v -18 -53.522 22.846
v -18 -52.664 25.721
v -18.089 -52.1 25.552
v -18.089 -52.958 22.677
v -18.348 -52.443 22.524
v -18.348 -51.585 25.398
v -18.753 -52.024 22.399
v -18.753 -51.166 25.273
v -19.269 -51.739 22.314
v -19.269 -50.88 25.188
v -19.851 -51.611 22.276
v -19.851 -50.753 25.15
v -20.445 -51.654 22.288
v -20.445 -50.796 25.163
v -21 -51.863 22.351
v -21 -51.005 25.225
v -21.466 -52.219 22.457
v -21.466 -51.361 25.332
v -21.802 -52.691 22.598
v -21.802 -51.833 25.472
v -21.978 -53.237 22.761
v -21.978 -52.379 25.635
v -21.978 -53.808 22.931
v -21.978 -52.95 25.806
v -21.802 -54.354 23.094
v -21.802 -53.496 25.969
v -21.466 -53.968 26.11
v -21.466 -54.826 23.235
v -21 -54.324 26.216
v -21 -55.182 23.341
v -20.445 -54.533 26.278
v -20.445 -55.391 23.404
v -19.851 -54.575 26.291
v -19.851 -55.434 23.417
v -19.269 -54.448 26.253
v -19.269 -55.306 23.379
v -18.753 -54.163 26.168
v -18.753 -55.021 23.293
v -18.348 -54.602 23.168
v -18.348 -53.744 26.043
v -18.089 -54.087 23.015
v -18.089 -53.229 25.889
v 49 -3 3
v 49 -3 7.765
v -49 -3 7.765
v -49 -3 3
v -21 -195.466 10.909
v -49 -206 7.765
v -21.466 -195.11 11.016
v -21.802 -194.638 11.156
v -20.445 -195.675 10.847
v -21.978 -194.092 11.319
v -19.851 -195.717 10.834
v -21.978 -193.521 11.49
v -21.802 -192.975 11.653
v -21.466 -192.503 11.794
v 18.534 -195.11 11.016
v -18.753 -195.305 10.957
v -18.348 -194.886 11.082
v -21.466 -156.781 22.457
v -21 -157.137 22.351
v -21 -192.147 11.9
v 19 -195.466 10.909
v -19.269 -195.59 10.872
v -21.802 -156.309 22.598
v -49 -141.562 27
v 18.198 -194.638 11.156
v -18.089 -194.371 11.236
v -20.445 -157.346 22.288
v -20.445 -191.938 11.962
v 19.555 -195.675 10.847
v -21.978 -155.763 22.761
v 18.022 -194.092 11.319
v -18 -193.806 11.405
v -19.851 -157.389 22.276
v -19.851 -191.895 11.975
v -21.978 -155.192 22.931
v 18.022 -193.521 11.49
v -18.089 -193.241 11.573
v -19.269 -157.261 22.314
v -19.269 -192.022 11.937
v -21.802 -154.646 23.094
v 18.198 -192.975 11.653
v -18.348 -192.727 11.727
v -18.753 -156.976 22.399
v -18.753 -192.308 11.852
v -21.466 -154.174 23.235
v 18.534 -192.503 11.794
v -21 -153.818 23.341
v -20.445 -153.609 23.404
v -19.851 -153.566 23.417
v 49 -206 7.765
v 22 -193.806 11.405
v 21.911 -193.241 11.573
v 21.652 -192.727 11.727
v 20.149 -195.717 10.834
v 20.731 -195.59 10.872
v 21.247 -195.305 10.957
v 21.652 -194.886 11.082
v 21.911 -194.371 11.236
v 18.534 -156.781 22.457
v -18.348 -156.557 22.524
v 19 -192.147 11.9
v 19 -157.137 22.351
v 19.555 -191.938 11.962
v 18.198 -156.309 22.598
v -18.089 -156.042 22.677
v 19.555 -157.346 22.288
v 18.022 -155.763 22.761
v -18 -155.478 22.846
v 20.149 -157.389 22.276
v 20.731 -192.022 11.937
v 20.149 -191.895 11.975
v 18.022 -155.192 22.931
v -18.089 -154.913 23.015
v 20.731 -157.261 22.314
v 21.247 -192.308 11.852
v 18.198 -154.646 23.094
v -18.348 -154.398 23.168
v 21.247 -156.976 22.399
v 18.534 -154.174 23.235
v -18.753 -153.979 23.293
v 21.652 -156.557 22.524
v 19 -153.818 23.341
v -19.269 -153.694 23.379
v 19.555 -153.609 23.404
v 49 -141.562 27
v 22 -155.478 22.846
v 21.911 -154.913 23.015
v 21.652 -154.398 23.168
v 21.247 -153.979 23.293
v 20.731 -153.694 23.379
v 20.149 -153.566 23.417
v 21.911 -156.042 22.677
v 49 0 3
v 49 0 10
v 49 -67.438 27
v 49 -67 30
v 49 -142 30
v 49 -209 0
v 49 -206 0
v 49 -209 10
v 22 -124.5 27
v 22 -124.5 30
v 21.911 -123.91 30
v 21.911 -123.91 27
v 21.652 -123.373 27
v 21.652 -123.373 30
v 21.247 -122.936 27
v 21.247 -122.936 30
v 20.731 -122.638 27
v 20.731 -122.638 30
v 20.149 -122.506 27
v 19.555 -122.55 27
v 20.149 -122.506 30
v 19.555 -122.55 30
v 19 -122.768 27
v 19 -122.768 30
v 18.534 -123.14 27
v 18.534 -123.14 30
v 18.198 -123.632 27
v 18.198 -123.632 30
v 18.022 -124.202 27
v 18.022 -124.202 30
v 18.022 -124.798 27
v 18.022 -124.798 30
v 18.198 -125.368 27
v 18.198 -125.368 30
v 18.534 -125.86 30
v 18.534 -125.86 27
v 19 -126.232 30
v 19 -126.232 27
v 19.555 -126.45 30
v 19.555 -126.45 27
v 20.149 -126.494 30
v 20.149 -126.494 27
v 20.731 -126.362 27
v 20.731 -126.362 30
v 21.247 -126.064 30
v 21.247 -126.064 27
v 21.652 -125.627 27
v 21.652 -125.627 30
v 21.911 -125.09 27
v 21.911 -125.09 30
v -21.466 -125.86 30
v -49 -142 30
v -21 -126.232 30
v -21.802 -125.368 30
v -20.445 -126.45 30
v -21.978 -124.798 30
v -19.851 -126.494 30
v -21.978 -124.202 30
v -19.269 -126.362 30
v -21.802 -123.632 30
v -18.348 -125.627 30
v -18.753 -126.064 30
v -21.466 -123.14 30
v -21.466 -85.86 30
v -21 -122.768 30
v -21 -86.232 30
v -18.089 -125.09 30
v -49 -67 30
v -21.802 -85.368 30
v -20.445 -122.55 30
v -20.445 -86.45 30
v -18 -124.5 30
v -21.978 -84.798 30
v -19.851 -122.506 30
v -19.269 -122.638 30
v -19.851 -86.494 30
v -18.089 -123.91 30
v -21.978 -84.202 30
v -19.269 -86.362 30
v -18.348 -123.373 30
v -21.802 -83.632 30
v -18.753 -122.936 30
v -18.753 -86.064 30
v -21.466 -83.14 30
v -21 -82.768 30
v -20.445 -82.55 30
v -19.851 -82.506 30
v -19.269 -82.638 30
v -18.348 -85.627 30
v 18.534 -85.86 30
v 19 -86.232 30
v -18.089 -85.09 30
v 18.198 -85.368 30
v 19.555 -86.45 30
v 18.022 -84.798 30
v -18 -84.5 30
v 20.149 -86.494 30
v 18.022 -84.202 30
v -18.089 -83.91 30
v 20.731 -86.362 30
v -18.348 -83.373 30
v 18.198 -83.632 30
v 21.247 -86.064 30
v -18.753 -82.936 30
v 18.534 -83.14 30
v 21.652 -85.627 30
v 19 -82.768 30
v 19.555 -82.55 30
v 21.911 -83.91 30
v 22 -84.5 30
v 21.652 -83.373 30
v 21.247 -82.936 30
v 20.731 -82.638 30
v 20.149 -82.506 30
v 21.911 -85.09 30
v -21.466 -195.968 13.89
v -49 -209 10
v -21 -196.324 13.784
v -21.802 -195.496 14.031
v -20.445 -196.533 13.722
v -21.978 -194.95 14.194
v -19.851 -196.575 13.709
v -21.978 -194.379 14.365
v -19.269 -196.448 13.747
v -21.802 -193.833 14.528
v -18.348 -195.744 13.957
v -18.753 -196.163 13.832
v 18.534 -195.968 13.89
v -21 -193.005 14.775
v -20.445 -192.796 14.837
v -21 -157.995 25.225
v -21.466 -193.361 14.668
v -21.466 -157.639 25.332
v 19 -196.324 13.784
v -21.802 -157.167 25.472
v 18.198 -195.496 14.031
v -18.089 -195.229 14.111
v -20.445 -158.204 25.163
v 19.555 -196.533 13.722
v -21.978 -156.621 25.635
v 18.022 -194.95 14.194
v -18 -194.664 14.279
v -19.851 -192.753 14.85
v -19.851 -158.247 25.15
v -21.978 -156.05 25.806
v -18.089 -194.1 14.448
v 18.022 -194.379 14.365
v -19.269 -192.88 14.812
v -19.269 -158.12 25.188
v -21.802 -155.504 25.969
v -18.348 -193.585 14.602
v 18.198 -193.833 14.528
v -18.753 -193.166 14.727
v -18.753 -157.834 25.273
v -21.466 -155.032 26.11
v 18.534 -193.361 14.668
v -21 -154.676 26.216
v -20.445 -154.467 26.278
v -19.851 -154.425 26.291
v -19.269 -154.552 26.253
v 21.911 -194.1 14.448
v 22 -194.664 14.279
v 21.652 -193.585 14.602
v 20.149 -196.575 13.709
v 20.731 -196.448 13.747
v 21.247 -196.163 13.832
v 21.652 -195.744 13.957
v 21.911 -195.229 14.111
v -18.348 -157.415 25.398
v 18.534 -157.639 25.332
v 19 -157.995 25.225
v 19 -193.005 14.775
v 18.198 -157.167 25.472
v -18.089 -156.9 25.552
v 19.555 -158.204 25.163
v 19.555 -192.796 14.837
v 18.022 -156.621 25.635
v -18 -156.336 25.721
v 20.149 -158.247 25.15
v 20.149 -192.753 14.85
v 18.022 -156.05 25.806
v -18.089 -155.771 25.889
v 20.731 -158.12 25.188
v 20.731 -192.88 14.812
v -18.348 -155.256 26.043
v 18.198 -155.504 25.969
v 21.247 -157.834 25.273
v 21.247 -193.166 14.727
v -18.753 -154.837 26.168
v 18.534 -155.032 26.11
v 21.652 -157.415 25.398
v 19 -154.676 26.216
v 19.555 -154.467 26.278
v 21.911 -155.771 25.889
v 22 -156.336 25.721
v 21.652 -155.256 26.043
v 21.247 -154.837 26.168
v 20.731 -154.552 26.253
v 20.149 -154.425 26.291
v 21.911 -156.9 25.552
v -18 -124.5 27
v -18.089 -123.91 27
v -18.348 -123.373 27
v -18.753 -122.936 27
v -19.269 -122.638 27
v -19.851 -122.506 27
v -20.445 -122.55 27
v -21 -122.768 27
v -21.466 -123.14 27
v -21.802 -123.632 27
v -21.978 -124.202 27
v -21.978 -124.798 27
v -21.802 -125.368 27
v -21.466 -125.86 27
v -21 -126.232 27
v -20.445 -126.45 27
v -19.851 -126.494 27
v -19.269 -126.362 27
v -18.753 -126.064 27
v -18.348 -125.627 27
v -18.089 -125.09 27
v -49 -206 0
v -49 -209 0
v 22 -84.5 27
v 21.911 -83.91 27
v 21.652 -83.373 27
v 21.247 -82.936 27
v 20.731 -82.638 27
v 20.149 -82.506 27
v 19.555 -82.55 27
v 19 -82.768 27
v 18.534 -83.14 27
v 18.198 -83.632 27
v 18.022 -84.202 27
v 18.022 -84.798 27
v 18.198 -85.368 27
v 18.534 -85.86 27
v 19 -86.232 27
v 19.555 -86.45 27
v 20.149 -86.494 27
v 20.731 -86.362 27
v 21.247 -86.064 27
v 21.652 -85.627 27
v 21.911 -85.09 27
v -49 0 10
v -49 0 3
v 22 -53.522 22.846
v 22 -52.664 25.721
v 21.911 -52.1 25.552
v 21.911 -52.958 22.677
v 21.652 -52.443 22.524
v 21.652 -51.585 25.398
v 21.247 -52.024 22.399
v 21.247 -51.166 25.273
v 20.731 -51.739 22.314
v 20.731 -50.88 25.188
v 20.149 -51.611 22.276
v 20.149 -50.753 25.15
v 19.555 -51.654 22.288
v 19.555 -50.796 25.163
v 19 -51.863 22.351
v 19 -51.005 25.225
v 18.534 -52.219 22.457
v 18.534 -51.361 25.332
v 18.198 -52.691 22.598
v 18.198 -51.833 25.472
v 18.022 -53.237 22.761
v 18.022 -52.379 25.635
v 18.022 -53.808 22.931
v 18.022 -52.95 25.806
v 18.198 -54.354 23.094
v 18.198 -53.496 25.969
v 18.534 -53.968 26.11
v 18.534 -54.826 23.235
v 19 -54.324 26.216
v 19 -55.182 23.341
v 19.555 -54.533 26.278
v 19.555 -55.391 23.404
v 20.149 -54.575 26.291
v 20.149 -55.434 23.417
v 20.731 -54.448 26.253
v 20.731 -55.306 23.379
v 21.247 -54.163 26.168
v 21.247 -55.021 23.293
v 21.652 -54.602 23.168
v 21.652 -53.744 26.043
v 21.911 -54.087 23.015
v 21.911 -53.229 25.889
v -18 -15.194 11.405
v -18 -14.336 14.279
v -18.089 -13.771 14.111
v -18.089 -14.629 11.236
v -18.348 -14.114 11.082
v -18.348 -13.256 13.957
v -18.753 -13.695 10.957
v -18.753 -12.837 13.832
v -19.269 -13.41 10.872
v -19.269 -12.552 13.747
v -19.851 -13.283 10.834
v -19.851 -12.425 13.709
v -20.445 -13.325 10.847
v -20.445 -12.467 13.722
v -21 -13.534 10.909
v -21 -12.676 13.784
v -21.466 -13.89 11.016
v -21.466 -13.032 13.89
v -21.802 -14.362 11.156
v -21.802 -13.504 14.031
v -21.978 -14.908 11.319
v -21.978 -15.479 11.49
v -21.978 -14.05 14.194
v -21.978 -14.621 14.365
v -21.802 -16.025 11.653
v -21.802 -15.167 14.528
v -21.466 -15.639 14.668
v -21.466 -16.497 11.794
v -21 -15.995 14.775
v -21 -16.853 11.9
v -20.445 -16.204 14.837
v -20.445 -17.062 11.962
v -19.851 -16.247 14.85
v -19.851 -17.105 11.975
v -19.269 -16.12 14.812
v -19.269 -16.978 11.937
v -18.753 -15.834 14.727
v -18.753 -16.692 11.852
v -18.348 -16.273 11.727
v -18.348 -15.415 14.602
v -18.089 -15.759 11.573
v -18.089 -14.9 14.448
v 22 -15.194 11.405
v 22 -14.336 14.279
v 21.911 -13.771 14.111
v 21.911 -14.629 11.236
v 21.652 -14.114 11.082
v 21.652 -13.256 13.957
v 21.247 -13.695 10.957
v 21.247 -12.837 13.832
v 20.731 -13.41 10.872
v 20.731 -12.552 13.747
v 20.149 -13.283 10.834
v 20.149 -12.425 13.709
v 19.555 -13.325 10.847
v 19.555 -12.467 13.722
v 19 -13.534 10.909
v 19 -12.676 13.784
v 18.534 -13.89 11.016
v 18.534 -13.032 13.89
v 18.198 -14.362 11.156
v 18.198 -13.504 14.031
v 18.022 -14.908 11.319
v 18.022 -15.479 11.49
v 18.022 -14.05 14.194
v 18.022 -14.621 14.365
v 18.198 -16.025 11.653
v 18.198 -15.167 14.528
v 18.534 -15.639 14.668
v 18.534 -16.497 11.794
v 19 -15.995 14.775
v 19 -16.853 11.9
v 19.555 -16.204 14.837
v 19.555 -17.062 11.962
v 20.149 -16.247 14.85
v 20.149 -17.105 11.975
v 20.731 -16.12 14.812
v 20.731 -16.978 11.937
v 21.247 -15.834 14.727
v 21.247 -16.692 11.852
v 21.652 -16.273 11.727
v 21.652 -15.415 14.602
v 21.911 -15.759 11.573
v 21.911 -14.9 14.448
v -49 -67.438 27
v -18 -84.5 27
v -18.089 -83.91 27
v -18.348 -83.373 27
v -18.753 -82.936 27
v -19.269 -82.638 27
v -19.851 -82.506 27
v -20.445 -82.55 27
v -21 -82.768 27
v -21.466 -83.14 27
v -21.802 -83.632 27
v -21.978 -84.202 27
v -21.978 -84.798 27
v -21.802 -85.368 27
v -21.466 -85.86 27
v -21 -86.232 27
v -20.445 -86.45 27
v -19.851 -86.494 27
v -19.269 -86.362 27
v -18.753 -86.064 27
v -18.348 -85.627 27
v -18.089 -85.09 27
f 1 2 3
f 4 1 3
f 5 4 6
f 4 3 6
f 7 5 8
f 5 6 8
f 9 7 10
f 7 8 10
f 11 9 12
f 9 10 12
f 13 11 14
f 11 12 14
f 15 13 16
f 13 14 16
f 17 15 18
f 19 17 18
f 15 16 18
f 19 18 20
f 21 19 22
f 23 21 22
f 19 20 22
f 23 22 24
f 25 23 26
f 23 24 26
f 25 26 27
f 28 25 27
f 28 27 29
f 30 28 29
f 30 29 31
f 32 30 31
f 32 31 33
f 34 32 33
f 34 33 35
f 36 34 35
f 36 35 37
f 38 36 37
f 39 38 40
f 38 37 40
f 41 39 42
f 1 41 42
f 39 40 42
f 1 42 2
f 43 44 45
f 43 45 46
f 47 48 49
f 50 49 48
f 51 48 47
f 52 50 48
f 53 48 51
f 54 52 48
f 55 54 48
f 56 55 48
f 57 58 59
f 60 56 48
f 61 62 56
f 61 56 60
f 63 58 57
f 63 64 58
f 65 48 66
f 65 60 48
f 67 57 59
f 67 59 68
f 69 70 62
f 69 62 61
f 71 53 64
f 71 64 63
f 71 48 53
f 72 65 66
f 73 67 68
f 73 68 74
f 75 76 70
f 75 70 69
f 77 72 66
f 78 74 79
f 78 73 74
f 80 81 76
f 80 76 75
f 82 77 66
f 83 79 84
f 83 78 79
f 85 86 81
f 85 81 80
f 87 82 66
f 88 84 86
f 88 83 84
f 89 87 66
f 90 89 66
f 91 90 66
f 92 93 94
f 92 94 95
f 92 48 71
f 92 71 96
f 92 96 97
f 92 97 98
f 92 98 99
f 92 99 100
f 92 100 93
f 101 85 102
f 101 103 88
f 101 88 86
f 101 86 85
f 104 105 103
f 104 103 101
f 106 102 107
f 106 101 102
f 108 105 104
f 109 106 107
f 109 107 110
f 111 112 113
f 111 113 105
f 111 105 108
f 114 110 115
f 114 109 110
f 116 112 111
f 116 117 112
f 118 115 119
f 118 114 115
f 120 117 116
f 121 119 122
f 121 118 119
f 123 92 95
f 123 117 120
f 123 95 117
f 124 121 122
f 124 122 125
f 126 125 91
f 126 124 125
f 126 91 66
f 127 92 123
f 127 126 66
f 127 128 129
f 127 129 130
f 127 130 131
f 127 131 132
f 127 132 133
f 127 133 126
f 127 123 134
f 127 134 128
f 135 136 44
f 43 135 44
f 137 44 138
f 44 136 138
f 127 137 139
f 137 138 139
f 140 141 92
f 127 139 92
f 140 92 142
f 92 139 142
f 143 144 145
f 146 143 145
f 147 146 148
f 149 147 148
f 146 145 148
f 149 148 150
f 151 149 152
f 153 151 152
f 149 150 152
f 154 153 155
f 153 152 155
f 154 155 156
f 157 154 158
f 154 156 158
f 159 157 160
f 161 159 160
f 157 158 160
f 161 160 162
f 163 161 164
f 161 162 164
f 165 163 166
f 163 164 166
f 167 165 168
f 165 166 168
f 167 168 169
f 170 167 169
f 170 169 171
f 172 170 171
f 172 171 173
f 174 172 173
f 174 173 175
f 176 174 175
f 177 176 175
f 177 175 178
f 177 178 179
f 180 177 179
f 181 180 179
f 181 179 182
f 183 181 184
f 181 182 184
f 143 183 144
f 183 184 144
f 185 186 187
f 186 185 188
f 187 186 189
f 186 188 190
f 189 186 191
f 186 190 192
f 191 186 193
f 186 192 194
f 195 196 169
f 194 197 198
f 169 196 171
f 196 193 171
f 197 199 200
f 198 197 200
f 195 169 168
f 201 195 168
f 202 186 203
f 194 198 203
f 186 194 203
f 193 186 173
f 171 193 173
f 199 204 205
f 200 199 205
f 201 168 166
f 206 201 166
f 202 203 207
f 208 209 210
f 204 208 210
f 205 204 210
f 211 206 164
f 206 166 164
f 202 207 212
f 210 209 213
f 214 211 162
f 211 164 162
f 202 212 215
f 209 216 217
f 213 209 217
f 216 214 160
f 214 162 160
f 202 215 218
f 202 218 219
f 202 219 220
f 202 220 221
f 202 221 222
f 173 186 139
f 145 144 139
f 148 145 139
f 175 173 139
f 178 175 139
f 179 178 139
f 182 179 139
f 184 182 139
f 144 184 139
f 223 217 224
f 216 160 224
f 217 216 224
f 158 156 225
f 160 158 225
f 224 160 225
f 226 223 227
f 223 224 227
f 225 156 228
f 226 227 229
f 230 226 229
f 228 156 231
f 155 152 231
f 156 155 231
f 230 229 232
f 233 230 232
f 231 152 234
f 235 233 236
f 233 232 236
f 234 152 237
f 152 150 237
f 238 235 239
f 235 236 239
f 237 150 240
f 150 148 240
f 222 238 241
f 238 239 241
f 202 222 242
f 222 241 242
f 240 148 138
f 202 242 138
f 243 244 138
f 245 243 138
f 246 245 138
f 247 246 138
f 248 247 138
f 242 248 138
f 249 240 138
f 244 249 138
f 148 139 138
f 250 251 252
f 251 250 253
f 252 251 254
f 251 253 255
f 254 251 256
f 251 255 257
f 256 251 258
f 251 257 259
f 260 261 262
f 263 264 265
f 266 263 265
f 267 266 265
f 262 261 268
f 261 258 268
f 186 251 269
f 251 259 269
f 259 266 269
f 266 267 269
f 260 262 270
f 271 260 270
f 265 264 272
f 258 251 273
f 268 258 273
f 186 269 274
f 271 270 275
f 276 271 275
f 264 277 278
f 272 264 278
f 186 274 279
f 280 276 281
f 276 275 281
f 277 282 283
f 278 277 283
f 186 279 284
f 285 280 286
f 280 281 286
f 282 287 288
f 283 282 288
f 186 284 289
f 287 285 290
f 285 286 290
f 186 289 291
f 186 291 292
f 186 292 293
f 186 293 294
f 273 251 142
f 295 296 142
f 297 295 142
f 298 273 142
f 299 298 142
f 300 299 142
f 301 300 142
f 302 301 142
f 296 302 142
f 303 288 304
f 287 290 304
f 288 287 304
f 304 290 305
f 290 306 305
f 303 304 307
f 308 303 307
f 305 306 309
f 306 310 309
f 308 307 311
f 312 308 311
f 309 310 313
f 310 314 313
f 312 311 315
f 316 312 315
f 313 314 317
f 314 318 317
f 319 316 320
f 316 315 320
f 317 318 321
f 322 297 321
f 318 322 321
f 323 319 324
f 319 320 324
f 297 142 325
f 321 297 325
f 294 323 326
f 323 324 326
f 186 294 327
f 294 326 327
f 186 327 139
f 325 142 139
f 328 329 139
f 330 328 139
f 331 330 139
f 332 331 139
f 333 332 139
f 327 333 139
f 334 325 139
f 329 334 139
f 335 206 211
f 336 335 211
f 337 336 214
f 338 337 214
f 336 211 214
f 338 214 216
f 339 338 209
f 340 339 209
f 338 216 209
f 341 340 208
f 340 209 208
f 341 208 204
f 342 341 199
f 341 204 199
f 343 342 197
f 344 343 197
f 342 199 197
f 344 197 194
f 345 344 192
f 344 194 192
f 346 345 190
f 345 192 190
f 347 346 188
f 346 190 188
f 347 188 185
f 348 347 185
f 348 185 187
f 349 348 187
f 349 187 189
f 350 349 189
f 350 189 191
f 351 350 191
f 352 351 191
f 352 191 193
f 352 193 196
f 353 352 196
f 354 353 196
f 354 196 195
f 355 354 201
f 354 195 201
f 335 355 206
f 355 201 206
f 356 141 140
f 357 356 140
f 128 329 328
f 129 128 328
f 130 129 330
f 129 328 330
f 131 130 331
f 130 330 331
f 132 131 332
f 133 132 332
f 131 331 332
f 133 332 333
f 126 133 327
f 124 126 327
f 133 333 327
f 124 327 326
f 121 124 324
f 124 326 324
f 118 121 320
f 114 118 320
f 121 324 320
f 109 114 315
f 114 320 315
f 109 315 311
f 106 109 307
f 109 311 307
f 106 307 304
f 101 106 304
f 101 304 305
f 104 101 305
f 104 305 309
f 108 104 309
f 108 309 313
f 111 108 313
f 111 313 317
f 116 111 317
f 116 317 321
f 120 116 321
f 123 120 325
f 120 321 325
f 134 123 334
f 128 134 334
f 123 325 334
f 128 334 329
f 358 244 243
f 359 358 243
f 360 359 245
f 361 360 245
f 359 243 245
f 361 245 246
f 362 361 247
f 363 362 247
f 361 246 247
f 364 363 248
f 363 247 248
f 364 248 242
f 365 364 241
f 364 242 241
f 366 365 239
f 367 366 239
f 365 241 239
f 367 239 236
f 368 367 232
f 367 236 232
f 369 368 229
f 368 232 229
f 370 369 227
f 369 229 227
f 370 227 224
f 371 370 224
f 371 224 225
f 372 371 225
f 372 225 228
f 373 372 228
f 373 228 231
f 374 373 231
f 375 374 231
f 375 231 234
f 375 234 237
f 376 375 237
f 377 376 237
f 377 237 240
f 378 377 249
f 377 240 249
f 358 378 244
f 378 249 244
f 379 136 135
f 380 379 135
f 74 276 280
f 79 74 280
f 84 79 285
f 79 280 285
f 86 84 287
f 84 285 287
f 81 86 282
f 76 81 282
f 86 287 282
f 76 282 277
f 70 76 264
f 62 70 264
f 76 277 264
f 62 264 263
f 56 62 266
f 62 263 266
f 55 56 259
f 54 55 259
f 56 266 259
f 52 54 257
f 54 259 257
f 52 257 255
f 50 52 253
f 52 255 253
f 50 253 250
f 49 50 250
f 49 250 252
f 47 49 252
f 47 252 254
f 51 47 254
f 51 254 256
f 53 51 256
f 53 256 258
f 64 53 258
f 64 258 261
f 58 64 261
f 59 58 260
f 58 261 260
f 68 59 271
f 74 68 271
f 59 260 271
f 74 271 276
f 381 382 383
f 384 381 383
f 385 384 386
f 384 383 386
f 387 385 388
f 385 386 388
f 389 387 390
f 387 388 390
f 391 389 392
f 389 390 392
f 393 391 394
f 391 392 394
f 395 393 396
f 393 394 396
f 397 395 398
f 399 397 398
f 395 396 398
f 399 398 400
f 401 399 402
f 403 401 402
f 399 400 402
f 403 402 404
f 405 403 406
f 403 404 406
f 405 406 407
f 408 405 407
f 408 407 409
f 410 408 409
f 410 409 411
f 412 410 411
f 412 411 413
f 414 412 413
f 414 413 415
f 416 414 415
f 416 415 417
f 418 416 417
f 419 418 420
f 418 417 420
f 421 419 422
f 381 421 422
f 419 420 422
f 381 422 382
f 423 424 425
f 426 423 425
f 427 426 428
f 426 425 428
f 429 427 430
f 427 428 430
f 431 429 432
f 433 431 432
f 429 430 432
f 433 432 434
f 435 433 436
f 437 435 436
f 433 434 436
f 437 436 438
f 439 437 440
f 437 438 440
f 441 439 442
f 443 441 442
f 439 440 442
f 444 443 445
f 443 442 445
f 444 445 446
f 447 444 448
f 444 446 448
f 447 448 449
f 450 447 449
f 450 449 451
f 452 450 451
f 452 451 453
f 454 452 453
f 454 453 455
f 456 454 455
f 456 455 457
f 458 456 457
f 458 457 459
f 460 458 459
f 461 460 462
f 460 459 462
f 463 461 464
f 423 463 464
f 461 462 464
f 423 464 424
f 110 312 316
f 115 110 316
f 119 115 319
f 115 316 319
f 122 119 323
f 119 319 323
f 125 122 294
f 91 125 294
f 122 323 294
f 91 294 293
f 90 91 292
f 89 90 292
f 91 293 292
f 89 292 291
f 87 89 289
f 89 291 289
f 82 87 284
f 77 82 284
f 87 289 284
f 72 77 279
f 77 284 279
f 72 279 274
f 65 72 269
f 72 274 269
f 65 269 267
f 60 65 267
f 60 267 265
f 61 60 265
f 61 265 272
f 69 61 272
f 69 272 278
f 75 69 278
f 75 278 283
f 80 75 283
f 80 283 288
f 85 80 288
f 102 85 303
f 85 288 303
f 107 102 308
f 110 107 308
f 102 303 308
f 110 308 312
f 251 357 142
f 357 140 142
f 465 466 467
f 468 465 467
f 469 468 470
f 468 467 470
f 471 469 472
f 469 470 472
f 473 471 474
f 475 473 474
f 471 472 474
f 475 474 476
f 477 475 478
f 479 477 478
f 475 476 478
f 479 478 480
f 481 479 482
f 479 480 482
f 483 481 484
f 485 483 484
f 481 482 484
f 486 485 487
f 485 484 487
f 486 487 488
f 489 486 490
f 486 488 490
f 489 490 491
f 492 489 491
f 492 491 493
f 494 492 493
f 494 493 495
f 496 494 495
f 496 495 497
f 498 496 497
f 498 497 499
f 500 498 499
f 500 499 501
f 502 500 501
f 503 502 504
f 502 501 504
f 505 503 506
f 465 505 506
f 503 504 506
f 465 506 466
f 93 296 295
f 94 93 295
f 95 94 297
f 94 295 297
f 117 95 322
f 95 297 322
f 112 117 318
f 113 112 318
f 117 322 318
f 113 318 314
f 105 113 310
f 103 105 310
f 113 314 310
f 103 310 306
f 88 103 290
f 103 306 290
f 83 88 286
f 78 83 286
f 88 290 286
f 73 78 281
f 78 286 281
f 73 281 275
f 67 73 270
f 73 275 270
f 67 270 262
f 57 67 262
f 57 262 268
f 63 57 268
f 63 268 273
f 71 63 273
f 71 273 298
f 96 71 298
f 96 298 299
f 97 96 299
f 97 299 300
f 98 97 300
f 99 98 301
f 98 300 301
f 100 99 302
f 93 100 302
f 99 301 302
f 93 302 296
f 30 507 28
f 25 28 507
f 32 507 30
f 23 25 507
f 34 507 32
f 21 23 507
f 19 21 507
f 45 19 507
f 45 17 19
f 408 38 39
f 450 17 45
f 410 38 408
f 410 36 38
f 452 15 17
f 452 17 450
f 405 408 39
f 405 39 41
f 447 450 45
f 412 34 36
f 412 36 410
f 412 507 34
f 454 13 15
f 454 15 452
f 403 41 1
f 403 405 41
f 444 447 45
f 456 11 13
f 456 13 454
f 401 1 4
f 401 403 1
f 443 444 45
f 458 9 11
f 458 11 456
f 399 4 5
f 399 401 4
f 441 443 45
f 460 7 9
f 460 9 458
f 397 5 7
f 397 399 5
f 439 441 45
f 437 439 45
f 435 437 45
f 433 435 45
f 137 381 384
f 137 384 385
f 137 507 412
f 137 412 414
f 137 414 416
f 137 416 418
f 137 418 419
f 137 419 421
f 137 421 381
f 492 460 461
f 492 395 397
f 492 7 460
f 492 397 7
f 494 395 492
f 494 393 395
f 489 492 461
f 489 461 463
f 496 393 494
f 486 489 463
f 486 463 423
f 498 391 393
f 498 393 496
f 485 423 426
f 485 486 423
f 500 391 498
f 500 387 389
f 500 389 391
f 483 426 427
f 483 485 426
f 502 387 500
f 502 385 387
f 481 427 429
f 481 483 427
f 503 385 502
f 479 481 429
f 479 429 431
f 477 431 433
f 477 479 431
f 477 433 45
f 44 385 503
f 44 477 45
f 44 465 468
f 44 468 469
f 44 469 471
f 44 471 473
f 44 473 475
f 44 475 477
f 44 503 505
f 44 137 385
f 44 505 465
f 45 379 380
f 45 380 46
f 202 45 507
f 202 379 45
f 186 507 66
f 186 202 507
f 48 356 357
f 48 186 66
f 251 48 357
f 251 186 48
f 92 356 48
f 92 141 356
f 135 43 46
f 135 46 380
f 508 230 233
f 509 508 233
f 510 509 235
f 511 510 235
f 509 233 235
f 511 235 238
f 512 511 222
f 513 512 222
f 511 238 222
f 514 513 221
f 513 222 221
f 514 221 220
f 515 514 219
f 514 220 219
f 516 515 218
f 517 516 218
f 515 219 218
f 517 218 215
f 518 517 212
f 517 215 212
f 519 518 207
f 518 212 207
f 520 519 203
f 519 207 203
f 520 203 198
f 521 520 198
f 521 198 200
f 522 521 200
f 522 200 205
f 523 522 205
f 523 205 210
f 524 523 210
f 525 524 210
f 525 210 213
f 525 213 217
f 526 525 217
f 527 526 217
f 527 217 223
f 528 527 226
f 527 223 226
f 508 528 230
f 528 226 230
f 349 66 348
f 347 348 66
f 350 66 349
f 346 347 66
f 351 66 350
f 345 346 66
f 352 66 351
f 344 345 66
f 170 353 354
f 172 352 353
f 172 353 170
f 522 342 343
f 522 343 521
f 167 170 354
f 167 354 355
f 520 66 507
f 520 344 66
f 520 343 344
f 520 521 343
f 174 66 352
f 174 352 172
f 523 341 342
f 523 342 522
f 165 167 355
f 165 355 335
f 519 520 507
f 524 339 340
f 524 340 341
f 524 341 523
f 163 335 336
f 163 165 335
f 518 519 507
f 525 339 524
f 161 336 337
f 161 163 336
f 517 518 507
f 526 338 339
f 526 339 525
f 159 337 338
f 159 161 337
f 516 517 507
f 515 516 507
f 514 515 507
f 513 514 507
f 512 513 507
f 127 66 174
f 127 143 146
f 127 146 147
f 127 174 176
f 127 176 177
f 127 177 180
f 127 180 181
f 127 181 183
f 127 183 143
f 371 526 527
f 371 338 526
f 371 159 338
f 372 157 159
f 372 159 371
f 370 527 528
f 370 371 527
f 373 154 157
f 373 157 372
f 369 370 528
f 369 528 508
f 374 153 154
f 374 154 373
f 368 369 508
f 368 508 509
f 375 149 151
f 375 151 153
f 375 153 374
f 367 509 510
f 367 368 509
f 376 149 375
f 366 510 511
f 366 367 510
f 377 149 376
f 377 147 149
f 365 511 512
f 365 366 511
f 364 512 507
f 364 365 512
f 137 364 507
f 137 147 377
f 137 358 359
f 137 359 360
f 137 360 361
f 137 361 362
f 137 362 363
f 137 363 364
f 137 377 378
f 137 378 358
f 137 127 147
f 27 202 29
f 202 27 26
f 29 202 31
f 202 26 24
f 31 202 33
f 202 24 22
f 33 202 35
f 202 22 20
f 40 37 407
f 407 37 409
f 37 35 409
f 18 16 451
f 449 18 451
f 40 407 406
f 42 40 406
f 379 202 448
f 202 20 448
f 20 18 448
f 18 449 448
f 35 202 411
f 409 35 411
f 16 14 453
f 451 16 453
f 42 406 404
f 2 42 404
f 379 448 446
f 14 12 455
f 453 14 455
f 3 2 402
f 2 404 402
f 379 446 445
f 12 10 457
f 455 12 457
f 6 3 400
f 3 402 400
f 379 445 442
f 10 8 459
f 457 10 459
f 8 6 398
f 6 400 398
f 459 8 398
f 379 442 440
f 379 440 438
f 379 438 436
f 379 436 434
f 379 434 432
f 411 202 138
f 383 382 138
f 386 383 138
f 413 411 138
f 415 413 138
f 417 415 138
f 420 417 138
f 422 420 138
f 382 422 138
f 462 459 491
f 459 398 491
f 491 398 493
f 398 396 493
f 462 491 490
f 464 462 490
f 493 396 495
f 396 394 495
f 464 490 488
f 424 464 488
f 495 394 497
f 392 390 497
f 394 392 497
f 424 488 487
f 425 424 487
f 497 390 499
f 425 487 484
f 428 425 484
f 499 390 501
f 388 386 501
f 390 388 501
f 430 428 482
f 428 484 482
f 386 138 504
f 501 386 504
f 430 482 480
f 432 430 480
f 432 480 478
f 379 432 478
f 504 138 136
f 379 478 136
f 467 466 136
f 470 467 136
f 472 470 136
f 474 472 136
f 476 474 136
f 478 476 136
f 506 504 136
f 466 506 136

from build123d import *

# Parameters (mm, degrees)
PAD009_DEPTH    = 49
THICKNESS002_T  = -3
SKETCH010_W     = 3
SKETCH010_H     = 3
POCKET_DEPTH    = 98.001
SKETCH011_R     = 2
POCKET001_DEPTH = 3
SKETCH012_R     = 2
POCKET002_DEPTH = 3
SKETCH013_R     = 2
POCKET003_DEPTH = 3


with BuildPart() as part:
    # Sketch009 → Pad009 (new body, symmetric)
    with BuildSketch(Plane.YZ):
        Polygon((0, 0), (-209, 0), (-209, 10), (-142, 30), (-67, 30), (0, 10), align=None)
    extrude(amount=PAD009_DEPTH, both=True)

    # Thickness002
    thickness002_openings = [part.faces().sort_by_distance(p)[0] for p in [
        (49, -104.5, 12.734956),
        (0, -104.5, 0),
        (-49, -104.5, 12.734956),
    ]]
    offset(amount=THICKNESS002_T, openings=thickness002_openings)

    # Sketch010 (on Face6 of Thickness002) → Pocket (cut, through all)
    with BuildSketch(Plane.YZ.offset(49)):
        with Locations((-1.5, 1.5)):
            Rectangle(SKETCH010_W, SKETCH010_H)
    extrude(amount=-POCKET_DEPTH, mode=Mode.SUBTRACT)

    # Sketch011 (on Face3 of Pocket) → Pocket001 (cut)
    with BuildSketch(Plane(origin=(0, -19.8404581714, 66.4655348742), x_dir=(1, 0, 0), z_dir=(0, -0.2860355264, 0.9582190134))):
        with Locations((-20, -142.4467263242)):
            Circle(SKETCH011_R)
        with Locations((20, -142.4467263242)):
            Circle(SKETCH011_R)
        with Locations((20, -182.4467263242)):
            Circle(SKETCH011_R)
        with Locations((-20, -182.4467263242)):
            Circle(SKETCH011_R)
    extrude(amount=-POCKET001_DEPTH, mode=Mode.SUBTRACT)

    # Sketch012 (on Face7 of Pocket001) → Pocket002 (cut)
    with BuildSketch(Plane.XY.offset(30)):
        with Locations((-20, -124.5)):
            Circle(SKETCH012_R)
        with Locations((20, -124.5)):
            Circle(SKETCH012_R)
        with Locations((-20, -84.5)):
            Circle(SKETCH012_R)
        with Locations((20, -84.5)):
            Circle(SKETCH012_R)
    extrude(amount=-POCKET002_DEPTH, mode=Mode.SUBTRACT)

    # Sketch013 (on Face13 of Pocket002) → Pocket003 (cut)
    with BuildSketch(Plane(origin=(0, 2.7408467989, 9.1818367764), x_dir=(1, 0, 0), z_dir=(0, 0.2860355264, 0.9582190134))):
        with Locations((-20, -17.8210474767)):
            Circle(SKETCH013_R)
        with Locations((20, -17.8210474767)):
            Circle(SKETCH013_R)
        with Locations((20, -57.8210474767)):
            Circle(SKETCH013_R)
        with Locations((-20, -57.8210474767)):
            Circle(SKETCH013_R)
    extrude(amount=-POCKET003_DEPTH, mode=Mode.SUBTRACT)


solid = part.part
